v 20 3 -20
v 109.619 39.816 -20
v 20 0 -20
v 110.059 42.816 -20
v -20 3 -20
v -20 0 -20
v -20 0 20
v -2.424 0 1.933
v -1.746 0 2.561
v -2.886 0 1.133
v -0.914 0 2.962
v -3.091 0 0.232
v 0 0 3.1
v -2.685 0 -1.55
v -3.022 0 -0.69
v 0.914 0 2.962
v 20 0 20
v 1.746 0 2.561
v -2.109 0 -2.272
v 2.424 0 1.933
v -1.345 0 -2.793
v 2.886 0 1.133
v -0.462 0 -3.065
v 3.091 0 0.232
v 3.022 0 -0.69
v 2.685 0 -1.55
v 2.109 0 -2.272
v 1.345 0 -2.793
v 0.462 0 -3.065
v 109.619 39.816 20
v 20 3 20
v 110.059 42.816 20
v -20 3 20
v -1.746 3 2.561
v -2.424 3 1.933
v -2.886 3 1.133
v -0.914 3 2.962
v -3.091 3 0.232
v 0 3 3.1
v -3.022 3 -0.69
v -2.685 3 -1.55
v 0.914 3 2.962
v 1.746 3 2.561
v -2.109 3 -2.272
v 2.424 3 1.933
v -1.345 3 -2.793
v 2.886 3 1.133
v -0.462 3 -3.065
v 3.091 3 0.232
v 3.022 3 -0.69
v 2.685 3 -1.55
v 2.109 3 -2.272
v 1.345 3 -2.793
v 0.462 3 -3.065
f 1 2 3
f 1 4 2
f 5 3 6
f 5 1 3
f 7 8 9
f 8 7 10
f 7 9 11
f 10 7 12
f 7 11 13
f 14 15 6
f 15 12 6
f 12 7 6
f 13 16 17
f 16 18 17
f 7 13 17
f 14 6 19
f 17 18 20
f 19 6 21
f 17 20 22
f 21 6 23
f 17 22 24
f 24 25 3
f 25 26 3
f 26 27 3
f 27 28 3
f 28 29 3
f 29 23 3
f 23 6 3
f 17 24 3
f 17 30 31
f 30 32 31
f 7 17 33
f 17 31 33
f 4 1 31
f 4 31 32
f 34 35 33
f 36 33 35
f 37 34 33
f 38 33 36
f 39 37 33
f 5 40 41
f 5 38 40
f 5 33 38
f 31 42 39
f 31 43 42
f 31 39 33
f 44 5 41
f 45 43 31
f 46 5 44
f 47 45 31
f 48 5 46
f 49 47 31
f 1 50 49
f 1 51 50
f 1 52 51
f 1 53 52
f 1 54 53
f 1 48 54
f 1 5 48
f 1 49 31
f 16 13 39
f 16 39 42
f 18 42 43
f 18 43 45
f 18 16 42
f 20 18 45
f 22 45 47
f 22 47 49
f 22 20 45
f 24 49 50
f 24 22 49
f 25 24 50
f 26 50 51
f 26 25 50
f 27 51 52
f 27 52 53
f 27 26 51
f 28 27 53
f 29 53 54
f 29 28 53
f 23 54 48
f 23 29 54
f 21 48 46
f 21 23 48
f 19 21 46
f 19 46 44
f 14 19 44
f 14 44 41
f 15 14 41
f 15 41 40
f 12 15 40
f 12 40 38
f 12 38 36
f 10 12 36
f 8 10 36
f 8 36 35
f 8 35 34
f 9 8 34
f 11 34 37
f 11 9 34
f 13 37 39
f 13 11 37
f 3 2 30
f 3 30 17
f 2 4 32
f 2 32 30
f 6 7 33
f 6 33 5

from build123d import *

# Parameters (mm, degrees)
SKETCH1_W           = 40
SKETCH1_H           = 40
SKETCH1_R           = 3.1
BOSS_EXTRUDE1_DEPTH = 3
BOSS_EXTRUDE2_DEPTH = 40


with BuildPart() as part:
    # Sketch1 → Boss-Extrude1 (new body)
    with BuildSketch(Plane(origin=(0, 0, 0), x_dir=(1, 0, 0), z_dir=(0, 1, 0))):
        Rectangle(SKETCH1_W, SKETCH1_H)
        with Locations(Location((0, 0, 0), (0, 0, 270))):
            Circle(SKETCH1_R, mode=Mode.SUBTRACT)
    extrude(amount=BOSS_EXTRUDE1_DEPTH)

    # Sketch6 → Boss-Extrude2 (add)
    with BuildSketch(Plane(origin=(0, 0, -20), x_dir=(-1, 0, 0), z_dir=(0, 0, -1))):
        Polygon((-109.619318504, 39.815596494), (-20, 0), (-20, 3), (-110.058959884, 42.815596494), align=None)
    extrude(amount=-BOSS_EXTRUDE2_DEPTH)


solid = part.part
